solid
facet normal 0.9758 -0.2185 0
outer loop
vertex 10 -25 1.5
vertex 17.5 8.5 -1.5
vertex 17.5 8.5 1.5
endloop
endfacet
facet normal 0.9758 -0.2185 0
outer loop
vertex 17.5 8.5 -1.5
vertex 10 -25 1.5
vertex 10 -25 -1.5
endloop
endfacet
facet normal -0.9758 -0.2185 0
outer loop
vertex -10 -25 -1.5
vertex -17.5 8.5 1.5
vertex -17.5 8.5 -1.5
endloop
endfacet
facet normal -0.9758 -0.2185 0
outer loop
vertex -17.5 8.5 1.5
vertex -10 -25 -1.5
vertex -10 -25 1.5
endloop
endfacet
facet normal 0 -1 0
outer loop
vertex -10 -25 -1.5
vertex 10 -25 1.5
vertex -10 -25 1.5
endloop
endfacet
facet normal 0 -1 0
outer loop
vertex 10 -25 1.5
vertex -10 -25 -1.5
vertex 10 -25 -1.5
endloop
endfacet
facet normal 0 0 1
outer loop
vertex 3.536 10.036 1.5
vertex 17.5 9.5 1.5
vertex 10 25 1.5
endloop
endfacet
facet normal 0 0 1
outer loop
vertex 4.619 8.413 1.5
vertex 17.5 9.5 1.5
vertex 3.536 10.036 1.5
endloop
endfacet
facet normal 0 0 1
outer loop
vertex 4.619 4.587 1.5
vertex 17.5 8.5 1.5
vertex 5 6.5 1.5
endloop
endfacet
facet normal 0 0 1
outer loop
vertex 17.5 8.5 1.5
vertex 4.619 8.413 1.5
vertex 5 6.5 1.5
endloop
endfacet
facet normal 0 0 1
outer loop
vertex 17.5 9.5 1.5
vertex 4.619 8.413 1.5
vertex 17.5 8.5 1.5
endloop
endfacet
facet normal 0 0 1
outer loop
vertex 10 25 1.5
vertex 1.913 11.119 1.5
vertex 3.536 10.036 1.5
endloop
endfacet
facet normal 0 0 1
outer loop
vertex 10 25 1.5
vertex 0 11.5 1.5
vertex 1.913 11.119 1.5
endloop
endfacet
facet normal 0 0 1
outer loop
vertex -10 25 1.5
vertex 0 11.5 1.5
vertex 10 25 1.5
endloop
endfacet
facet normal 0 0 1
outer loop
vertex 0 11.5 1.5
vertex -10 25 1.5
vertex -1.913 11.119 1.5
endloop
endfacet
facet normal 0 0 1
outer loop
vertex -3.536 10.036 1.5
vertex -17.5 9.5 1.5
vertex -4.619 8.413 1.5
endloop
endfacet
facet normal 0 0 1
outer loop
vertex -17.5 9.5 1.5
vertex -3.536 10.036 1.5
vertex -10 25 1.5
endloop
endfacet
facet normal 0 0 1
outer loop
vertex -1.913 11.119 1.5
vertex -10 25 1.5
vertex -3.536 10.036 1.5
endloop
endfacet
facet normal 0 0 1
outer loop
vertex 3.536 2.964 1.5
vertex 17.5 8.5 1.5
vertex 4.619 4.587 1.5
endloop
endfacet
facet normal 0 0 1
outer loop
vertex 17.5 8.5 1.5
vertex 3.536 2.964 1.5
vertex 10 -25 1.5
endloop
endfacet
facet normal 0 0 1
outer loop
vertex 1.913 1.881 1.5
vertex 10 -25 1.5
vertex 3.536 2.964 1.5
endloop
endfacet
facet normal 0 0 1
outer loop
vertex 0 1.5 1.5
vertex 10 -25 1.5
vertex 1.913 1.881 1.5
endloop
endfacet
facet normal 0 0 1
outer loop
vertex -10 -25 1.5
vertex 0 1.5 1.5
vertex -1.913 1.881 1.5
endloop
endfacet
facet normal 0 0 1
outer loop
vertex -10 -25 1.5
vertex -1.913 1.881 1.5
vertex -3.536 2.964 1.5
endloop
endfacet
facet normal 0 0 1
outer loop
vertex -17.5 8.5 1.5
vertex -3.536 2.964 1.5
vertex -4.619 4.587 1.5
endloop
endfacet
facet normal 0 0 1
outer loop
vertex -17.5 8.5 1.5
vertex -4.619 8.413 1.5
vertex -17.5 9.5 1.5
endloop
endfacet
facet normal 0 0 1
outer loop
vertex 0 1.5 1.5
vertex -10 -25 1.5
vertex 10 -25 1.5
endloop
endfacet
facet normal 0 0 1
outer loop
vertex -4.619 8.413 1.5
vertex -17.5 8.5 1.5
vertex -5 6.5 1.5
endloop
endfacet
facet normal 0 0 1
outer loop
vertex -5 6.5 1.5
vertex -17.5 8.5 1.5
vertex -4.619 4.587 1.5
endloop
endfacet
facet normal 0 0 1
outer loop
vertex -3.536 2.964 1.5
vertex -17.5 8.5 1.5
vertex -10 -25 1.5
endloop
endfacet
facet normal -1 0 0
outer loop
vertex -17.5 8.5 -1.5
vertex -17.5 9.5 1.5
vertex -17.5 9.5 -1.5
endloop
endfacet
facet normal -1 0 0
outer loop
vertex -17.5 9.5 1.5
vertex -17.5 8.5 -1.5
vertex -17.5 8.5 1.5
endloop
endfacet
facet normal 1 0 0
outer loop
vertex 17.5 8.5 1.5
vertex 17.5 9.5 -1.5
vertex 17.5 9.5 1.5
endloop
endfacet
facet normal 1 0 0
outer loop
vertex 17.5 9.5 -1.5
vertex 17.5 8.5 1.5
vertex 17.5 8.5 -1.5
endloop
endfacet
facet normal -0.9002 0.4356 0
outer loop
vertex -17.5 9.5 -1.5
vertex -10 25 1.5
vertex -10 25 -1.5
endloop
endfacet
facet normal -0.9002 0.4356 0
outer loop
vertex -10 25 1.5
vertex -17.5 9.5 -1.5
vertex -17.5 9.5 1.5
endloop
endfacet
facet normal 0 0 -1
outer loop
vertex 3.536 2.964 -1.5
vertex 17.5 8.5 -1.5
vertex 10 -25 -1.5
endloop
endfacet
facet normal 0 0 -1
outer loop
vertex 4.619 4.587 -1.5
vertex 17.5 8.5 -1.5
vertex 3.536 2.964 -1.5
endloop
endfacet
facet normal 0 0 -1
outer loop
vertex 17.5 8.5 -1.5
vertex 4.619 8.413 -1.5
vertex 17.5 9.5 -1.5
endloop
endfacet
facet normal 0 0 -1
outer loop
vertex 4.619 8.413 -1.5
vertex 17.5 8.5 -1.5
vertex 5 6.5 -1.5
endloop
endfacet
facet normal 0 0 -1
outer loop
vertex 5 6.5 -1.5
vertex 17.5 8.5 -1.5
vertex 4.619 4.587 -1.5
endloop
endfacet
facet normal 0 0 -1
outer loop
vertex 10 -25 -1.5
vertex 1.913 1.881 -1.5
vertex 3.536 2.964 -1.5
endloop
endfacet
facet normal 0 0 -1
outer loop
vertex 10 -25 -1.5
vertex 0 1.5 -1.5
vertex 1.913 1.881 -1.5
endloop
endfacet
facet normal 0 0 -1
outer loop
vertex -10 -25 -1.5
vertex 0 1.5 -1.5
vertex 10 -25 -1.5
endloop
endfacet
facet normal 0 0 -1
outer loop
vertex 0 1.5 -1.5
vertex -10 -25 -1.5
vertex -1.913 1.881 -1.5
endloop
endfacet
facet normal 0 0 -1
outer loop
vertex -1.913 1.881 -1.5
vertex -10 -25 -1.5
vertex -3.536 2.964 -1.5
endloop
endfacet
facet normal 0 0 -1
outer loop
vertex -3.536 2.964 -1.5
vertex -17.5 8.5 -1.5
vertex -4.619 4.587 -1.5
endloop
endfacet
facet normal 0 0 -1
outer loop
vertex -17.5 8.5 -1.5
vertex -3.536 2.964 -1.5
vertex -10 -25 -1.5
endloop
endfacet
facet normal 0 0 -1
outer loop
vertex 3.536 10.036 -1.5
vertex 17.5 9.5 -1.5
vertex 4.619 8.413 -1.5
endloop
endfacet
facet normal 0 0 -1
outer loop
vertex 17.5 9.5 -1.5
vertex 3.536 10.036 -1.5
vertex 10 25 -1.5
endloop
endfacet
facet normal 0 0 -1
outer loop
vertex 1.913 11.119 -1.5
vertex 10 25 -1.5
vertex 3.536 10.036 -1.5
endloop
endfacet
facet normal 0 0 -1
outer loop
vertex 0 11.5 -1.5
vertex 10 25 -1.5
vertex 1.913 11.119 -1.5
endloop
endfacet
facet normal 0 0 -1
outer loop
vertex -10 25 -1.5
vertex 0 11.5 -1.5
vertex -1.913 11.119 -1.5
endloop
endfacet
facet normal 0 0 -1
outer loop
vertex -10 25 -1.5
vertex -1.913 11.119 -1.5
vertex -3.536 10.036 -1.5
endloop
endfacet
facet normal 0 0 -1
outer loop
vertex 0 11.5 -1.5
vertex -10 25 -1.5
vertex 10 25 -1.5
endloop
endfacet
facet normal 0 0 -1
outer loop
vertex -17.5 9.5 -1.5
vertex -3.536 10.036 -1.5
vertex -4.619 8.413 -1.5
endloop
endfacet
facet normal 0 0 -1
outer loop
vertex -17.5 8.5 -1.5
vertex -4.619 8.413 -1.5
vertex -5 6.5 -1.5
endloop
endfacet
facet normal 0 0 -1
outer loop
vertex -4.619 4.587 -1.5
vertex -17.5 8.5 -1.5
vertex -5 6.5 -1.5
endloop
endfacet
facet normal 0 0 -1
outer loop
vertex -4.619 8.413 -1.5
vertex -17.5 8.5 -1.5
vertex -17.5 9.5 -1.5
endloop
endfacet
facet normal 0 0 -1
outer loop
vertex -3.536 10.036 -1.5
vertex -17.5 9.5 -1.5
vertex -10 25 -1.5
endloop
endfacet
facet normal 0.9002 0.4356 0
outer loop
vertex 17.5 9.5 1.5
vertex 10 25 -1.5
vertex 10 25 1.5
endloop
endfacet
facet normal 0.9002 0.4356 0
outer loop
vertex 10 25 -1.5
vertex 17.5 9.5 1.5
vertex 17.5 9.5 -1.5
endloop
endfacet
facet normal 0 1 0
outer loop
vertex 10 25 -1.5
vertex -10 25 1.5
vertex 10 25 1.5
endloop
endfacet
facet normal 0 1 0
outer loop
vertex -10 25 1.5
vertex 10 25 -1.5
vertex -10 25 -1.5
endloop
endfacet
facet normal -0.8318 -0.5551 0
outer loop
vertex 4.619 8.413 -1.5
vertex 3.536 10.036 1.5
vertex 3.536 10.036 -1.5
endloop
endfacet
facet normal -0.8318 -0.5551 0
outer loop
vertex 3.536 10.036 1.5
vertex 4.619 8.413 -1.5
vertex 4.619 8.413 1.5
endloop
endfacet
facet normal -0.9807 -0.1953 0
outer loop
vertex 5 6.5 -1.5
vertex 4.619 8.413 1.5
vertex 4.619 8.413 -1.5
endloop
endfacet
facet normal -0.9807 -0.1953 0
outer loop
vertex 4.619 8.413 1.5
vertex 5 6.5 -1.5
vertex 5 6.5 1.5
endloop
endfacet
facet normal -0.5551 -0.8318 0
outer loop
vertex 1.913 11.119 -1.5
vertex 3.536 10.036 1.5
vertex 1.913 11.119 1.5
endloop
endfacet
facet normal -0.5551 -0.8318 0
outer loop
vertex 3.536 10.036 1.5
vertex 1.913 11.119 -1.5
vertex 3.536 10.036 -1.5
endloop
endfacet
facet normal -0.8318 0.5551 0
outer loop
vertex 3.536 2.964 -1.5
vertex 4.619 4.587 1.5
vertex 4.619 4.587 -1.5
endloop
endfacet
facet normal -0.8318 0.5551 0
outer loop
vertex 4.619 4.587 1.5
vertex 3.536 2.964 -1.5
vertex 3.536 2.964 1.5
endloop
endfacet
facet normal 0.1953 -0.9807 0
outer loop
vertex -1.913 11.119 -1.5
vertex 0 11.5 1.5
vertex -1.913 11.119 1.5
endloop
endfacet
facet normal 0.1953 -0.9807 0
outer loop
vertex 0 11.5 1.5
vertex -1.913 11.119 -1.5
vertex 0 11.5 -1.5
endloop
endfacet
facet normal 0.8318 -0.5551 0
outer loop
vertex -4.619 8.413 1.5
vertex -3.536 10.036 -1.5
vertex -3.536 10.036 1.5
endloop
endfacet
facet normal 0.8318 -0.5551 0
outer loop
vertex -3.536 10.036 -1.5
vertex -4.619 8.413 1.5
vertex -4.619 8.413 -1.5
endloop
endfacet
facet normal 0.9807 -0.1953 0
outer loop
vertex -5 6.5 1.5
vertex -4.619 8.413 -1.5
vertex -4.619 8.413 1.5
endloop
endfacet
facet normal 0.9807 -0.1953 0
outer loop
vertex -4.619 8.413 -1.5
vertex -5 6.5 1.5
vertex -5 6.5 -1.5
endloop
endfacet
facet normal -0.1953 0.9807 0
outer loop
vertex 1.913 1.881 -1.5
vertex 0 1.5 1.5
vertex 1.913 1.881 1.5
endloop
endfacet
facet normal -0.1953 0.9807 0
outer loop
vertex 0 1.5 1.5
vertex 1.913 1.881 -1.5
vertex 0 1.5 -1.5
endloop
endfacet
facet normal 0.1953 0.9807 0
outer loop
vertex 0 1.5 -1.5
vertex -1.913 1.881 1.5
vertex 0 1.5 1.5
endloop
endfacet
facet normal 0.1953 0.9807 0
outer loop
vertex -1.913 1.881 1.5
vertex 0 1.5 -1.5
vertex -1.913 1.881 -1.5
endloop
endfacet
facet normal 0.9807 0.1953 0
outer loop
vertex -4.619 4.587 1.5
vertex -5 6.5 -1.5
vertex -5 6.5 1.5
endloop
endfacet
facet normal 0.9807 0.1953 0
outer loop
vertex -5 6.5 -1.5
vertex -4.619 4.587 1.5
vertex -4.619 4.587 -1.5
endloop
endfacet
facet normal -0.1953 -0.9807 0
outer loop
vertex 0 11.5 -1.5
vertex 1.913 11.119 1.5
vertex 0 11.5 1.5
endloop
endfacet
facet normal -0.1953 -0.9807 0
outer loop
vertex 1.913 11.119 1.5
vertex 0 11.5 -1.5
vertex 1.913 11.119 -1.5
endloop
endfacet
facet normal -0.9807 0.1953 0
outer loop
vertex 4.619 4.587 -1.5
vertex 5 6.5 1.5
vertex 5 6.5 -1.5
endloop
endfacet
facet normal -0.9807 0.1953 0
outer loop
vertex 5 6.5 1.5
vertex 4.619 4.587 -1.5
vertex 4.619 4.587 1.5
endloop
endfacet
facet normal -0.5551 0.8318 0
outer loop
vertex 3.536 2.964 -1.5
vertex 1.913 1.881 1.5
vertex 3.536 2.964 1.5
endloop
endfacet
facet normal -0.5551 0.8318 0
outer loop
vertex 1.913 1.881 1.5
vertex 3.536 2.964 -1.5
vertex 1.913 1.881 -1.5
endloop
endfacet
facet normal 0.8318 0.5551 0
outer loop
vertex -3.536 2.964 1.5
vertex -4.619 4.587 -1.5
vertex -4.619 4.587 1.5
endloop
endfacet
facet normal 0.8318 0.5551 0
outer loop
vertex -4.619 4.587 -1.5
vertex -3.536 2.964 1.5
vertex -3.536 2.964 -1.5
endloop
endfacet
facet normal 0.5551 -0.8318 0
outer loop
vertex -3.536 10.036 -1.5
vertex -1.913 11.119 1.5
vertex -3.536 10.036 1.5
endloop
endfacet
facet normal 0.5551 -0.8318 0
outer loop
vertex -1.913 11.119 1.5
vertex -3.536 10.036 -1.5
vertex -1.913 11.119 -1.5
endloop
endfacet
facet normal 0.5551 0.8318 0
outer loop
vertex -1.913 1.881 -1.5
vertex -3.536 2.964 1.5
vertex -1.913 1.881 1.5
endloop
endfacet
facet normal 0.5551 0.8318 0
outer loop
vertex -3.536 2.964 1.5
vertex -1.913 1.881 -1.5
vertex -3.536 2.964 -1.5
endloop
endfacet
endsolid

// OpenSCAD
hold_t=3;
hold_w=20;
hold_l1=50;
hold_l2=35;
hold_d=10;
hold_dl1=16;

difference() {
hull() {
	cube([hold_w,hold_l1,hold_t], center=true);
	translate([0,hold_l1/2-hold_dl1,0])
		cube([hold_l2,1,hold_t], center=true);
}
translate([0,hold_l1/2-hold_dl1-hold_d/4,0])
	cylinder(d=hold_d, h=hold_t*2, center=true);
}
